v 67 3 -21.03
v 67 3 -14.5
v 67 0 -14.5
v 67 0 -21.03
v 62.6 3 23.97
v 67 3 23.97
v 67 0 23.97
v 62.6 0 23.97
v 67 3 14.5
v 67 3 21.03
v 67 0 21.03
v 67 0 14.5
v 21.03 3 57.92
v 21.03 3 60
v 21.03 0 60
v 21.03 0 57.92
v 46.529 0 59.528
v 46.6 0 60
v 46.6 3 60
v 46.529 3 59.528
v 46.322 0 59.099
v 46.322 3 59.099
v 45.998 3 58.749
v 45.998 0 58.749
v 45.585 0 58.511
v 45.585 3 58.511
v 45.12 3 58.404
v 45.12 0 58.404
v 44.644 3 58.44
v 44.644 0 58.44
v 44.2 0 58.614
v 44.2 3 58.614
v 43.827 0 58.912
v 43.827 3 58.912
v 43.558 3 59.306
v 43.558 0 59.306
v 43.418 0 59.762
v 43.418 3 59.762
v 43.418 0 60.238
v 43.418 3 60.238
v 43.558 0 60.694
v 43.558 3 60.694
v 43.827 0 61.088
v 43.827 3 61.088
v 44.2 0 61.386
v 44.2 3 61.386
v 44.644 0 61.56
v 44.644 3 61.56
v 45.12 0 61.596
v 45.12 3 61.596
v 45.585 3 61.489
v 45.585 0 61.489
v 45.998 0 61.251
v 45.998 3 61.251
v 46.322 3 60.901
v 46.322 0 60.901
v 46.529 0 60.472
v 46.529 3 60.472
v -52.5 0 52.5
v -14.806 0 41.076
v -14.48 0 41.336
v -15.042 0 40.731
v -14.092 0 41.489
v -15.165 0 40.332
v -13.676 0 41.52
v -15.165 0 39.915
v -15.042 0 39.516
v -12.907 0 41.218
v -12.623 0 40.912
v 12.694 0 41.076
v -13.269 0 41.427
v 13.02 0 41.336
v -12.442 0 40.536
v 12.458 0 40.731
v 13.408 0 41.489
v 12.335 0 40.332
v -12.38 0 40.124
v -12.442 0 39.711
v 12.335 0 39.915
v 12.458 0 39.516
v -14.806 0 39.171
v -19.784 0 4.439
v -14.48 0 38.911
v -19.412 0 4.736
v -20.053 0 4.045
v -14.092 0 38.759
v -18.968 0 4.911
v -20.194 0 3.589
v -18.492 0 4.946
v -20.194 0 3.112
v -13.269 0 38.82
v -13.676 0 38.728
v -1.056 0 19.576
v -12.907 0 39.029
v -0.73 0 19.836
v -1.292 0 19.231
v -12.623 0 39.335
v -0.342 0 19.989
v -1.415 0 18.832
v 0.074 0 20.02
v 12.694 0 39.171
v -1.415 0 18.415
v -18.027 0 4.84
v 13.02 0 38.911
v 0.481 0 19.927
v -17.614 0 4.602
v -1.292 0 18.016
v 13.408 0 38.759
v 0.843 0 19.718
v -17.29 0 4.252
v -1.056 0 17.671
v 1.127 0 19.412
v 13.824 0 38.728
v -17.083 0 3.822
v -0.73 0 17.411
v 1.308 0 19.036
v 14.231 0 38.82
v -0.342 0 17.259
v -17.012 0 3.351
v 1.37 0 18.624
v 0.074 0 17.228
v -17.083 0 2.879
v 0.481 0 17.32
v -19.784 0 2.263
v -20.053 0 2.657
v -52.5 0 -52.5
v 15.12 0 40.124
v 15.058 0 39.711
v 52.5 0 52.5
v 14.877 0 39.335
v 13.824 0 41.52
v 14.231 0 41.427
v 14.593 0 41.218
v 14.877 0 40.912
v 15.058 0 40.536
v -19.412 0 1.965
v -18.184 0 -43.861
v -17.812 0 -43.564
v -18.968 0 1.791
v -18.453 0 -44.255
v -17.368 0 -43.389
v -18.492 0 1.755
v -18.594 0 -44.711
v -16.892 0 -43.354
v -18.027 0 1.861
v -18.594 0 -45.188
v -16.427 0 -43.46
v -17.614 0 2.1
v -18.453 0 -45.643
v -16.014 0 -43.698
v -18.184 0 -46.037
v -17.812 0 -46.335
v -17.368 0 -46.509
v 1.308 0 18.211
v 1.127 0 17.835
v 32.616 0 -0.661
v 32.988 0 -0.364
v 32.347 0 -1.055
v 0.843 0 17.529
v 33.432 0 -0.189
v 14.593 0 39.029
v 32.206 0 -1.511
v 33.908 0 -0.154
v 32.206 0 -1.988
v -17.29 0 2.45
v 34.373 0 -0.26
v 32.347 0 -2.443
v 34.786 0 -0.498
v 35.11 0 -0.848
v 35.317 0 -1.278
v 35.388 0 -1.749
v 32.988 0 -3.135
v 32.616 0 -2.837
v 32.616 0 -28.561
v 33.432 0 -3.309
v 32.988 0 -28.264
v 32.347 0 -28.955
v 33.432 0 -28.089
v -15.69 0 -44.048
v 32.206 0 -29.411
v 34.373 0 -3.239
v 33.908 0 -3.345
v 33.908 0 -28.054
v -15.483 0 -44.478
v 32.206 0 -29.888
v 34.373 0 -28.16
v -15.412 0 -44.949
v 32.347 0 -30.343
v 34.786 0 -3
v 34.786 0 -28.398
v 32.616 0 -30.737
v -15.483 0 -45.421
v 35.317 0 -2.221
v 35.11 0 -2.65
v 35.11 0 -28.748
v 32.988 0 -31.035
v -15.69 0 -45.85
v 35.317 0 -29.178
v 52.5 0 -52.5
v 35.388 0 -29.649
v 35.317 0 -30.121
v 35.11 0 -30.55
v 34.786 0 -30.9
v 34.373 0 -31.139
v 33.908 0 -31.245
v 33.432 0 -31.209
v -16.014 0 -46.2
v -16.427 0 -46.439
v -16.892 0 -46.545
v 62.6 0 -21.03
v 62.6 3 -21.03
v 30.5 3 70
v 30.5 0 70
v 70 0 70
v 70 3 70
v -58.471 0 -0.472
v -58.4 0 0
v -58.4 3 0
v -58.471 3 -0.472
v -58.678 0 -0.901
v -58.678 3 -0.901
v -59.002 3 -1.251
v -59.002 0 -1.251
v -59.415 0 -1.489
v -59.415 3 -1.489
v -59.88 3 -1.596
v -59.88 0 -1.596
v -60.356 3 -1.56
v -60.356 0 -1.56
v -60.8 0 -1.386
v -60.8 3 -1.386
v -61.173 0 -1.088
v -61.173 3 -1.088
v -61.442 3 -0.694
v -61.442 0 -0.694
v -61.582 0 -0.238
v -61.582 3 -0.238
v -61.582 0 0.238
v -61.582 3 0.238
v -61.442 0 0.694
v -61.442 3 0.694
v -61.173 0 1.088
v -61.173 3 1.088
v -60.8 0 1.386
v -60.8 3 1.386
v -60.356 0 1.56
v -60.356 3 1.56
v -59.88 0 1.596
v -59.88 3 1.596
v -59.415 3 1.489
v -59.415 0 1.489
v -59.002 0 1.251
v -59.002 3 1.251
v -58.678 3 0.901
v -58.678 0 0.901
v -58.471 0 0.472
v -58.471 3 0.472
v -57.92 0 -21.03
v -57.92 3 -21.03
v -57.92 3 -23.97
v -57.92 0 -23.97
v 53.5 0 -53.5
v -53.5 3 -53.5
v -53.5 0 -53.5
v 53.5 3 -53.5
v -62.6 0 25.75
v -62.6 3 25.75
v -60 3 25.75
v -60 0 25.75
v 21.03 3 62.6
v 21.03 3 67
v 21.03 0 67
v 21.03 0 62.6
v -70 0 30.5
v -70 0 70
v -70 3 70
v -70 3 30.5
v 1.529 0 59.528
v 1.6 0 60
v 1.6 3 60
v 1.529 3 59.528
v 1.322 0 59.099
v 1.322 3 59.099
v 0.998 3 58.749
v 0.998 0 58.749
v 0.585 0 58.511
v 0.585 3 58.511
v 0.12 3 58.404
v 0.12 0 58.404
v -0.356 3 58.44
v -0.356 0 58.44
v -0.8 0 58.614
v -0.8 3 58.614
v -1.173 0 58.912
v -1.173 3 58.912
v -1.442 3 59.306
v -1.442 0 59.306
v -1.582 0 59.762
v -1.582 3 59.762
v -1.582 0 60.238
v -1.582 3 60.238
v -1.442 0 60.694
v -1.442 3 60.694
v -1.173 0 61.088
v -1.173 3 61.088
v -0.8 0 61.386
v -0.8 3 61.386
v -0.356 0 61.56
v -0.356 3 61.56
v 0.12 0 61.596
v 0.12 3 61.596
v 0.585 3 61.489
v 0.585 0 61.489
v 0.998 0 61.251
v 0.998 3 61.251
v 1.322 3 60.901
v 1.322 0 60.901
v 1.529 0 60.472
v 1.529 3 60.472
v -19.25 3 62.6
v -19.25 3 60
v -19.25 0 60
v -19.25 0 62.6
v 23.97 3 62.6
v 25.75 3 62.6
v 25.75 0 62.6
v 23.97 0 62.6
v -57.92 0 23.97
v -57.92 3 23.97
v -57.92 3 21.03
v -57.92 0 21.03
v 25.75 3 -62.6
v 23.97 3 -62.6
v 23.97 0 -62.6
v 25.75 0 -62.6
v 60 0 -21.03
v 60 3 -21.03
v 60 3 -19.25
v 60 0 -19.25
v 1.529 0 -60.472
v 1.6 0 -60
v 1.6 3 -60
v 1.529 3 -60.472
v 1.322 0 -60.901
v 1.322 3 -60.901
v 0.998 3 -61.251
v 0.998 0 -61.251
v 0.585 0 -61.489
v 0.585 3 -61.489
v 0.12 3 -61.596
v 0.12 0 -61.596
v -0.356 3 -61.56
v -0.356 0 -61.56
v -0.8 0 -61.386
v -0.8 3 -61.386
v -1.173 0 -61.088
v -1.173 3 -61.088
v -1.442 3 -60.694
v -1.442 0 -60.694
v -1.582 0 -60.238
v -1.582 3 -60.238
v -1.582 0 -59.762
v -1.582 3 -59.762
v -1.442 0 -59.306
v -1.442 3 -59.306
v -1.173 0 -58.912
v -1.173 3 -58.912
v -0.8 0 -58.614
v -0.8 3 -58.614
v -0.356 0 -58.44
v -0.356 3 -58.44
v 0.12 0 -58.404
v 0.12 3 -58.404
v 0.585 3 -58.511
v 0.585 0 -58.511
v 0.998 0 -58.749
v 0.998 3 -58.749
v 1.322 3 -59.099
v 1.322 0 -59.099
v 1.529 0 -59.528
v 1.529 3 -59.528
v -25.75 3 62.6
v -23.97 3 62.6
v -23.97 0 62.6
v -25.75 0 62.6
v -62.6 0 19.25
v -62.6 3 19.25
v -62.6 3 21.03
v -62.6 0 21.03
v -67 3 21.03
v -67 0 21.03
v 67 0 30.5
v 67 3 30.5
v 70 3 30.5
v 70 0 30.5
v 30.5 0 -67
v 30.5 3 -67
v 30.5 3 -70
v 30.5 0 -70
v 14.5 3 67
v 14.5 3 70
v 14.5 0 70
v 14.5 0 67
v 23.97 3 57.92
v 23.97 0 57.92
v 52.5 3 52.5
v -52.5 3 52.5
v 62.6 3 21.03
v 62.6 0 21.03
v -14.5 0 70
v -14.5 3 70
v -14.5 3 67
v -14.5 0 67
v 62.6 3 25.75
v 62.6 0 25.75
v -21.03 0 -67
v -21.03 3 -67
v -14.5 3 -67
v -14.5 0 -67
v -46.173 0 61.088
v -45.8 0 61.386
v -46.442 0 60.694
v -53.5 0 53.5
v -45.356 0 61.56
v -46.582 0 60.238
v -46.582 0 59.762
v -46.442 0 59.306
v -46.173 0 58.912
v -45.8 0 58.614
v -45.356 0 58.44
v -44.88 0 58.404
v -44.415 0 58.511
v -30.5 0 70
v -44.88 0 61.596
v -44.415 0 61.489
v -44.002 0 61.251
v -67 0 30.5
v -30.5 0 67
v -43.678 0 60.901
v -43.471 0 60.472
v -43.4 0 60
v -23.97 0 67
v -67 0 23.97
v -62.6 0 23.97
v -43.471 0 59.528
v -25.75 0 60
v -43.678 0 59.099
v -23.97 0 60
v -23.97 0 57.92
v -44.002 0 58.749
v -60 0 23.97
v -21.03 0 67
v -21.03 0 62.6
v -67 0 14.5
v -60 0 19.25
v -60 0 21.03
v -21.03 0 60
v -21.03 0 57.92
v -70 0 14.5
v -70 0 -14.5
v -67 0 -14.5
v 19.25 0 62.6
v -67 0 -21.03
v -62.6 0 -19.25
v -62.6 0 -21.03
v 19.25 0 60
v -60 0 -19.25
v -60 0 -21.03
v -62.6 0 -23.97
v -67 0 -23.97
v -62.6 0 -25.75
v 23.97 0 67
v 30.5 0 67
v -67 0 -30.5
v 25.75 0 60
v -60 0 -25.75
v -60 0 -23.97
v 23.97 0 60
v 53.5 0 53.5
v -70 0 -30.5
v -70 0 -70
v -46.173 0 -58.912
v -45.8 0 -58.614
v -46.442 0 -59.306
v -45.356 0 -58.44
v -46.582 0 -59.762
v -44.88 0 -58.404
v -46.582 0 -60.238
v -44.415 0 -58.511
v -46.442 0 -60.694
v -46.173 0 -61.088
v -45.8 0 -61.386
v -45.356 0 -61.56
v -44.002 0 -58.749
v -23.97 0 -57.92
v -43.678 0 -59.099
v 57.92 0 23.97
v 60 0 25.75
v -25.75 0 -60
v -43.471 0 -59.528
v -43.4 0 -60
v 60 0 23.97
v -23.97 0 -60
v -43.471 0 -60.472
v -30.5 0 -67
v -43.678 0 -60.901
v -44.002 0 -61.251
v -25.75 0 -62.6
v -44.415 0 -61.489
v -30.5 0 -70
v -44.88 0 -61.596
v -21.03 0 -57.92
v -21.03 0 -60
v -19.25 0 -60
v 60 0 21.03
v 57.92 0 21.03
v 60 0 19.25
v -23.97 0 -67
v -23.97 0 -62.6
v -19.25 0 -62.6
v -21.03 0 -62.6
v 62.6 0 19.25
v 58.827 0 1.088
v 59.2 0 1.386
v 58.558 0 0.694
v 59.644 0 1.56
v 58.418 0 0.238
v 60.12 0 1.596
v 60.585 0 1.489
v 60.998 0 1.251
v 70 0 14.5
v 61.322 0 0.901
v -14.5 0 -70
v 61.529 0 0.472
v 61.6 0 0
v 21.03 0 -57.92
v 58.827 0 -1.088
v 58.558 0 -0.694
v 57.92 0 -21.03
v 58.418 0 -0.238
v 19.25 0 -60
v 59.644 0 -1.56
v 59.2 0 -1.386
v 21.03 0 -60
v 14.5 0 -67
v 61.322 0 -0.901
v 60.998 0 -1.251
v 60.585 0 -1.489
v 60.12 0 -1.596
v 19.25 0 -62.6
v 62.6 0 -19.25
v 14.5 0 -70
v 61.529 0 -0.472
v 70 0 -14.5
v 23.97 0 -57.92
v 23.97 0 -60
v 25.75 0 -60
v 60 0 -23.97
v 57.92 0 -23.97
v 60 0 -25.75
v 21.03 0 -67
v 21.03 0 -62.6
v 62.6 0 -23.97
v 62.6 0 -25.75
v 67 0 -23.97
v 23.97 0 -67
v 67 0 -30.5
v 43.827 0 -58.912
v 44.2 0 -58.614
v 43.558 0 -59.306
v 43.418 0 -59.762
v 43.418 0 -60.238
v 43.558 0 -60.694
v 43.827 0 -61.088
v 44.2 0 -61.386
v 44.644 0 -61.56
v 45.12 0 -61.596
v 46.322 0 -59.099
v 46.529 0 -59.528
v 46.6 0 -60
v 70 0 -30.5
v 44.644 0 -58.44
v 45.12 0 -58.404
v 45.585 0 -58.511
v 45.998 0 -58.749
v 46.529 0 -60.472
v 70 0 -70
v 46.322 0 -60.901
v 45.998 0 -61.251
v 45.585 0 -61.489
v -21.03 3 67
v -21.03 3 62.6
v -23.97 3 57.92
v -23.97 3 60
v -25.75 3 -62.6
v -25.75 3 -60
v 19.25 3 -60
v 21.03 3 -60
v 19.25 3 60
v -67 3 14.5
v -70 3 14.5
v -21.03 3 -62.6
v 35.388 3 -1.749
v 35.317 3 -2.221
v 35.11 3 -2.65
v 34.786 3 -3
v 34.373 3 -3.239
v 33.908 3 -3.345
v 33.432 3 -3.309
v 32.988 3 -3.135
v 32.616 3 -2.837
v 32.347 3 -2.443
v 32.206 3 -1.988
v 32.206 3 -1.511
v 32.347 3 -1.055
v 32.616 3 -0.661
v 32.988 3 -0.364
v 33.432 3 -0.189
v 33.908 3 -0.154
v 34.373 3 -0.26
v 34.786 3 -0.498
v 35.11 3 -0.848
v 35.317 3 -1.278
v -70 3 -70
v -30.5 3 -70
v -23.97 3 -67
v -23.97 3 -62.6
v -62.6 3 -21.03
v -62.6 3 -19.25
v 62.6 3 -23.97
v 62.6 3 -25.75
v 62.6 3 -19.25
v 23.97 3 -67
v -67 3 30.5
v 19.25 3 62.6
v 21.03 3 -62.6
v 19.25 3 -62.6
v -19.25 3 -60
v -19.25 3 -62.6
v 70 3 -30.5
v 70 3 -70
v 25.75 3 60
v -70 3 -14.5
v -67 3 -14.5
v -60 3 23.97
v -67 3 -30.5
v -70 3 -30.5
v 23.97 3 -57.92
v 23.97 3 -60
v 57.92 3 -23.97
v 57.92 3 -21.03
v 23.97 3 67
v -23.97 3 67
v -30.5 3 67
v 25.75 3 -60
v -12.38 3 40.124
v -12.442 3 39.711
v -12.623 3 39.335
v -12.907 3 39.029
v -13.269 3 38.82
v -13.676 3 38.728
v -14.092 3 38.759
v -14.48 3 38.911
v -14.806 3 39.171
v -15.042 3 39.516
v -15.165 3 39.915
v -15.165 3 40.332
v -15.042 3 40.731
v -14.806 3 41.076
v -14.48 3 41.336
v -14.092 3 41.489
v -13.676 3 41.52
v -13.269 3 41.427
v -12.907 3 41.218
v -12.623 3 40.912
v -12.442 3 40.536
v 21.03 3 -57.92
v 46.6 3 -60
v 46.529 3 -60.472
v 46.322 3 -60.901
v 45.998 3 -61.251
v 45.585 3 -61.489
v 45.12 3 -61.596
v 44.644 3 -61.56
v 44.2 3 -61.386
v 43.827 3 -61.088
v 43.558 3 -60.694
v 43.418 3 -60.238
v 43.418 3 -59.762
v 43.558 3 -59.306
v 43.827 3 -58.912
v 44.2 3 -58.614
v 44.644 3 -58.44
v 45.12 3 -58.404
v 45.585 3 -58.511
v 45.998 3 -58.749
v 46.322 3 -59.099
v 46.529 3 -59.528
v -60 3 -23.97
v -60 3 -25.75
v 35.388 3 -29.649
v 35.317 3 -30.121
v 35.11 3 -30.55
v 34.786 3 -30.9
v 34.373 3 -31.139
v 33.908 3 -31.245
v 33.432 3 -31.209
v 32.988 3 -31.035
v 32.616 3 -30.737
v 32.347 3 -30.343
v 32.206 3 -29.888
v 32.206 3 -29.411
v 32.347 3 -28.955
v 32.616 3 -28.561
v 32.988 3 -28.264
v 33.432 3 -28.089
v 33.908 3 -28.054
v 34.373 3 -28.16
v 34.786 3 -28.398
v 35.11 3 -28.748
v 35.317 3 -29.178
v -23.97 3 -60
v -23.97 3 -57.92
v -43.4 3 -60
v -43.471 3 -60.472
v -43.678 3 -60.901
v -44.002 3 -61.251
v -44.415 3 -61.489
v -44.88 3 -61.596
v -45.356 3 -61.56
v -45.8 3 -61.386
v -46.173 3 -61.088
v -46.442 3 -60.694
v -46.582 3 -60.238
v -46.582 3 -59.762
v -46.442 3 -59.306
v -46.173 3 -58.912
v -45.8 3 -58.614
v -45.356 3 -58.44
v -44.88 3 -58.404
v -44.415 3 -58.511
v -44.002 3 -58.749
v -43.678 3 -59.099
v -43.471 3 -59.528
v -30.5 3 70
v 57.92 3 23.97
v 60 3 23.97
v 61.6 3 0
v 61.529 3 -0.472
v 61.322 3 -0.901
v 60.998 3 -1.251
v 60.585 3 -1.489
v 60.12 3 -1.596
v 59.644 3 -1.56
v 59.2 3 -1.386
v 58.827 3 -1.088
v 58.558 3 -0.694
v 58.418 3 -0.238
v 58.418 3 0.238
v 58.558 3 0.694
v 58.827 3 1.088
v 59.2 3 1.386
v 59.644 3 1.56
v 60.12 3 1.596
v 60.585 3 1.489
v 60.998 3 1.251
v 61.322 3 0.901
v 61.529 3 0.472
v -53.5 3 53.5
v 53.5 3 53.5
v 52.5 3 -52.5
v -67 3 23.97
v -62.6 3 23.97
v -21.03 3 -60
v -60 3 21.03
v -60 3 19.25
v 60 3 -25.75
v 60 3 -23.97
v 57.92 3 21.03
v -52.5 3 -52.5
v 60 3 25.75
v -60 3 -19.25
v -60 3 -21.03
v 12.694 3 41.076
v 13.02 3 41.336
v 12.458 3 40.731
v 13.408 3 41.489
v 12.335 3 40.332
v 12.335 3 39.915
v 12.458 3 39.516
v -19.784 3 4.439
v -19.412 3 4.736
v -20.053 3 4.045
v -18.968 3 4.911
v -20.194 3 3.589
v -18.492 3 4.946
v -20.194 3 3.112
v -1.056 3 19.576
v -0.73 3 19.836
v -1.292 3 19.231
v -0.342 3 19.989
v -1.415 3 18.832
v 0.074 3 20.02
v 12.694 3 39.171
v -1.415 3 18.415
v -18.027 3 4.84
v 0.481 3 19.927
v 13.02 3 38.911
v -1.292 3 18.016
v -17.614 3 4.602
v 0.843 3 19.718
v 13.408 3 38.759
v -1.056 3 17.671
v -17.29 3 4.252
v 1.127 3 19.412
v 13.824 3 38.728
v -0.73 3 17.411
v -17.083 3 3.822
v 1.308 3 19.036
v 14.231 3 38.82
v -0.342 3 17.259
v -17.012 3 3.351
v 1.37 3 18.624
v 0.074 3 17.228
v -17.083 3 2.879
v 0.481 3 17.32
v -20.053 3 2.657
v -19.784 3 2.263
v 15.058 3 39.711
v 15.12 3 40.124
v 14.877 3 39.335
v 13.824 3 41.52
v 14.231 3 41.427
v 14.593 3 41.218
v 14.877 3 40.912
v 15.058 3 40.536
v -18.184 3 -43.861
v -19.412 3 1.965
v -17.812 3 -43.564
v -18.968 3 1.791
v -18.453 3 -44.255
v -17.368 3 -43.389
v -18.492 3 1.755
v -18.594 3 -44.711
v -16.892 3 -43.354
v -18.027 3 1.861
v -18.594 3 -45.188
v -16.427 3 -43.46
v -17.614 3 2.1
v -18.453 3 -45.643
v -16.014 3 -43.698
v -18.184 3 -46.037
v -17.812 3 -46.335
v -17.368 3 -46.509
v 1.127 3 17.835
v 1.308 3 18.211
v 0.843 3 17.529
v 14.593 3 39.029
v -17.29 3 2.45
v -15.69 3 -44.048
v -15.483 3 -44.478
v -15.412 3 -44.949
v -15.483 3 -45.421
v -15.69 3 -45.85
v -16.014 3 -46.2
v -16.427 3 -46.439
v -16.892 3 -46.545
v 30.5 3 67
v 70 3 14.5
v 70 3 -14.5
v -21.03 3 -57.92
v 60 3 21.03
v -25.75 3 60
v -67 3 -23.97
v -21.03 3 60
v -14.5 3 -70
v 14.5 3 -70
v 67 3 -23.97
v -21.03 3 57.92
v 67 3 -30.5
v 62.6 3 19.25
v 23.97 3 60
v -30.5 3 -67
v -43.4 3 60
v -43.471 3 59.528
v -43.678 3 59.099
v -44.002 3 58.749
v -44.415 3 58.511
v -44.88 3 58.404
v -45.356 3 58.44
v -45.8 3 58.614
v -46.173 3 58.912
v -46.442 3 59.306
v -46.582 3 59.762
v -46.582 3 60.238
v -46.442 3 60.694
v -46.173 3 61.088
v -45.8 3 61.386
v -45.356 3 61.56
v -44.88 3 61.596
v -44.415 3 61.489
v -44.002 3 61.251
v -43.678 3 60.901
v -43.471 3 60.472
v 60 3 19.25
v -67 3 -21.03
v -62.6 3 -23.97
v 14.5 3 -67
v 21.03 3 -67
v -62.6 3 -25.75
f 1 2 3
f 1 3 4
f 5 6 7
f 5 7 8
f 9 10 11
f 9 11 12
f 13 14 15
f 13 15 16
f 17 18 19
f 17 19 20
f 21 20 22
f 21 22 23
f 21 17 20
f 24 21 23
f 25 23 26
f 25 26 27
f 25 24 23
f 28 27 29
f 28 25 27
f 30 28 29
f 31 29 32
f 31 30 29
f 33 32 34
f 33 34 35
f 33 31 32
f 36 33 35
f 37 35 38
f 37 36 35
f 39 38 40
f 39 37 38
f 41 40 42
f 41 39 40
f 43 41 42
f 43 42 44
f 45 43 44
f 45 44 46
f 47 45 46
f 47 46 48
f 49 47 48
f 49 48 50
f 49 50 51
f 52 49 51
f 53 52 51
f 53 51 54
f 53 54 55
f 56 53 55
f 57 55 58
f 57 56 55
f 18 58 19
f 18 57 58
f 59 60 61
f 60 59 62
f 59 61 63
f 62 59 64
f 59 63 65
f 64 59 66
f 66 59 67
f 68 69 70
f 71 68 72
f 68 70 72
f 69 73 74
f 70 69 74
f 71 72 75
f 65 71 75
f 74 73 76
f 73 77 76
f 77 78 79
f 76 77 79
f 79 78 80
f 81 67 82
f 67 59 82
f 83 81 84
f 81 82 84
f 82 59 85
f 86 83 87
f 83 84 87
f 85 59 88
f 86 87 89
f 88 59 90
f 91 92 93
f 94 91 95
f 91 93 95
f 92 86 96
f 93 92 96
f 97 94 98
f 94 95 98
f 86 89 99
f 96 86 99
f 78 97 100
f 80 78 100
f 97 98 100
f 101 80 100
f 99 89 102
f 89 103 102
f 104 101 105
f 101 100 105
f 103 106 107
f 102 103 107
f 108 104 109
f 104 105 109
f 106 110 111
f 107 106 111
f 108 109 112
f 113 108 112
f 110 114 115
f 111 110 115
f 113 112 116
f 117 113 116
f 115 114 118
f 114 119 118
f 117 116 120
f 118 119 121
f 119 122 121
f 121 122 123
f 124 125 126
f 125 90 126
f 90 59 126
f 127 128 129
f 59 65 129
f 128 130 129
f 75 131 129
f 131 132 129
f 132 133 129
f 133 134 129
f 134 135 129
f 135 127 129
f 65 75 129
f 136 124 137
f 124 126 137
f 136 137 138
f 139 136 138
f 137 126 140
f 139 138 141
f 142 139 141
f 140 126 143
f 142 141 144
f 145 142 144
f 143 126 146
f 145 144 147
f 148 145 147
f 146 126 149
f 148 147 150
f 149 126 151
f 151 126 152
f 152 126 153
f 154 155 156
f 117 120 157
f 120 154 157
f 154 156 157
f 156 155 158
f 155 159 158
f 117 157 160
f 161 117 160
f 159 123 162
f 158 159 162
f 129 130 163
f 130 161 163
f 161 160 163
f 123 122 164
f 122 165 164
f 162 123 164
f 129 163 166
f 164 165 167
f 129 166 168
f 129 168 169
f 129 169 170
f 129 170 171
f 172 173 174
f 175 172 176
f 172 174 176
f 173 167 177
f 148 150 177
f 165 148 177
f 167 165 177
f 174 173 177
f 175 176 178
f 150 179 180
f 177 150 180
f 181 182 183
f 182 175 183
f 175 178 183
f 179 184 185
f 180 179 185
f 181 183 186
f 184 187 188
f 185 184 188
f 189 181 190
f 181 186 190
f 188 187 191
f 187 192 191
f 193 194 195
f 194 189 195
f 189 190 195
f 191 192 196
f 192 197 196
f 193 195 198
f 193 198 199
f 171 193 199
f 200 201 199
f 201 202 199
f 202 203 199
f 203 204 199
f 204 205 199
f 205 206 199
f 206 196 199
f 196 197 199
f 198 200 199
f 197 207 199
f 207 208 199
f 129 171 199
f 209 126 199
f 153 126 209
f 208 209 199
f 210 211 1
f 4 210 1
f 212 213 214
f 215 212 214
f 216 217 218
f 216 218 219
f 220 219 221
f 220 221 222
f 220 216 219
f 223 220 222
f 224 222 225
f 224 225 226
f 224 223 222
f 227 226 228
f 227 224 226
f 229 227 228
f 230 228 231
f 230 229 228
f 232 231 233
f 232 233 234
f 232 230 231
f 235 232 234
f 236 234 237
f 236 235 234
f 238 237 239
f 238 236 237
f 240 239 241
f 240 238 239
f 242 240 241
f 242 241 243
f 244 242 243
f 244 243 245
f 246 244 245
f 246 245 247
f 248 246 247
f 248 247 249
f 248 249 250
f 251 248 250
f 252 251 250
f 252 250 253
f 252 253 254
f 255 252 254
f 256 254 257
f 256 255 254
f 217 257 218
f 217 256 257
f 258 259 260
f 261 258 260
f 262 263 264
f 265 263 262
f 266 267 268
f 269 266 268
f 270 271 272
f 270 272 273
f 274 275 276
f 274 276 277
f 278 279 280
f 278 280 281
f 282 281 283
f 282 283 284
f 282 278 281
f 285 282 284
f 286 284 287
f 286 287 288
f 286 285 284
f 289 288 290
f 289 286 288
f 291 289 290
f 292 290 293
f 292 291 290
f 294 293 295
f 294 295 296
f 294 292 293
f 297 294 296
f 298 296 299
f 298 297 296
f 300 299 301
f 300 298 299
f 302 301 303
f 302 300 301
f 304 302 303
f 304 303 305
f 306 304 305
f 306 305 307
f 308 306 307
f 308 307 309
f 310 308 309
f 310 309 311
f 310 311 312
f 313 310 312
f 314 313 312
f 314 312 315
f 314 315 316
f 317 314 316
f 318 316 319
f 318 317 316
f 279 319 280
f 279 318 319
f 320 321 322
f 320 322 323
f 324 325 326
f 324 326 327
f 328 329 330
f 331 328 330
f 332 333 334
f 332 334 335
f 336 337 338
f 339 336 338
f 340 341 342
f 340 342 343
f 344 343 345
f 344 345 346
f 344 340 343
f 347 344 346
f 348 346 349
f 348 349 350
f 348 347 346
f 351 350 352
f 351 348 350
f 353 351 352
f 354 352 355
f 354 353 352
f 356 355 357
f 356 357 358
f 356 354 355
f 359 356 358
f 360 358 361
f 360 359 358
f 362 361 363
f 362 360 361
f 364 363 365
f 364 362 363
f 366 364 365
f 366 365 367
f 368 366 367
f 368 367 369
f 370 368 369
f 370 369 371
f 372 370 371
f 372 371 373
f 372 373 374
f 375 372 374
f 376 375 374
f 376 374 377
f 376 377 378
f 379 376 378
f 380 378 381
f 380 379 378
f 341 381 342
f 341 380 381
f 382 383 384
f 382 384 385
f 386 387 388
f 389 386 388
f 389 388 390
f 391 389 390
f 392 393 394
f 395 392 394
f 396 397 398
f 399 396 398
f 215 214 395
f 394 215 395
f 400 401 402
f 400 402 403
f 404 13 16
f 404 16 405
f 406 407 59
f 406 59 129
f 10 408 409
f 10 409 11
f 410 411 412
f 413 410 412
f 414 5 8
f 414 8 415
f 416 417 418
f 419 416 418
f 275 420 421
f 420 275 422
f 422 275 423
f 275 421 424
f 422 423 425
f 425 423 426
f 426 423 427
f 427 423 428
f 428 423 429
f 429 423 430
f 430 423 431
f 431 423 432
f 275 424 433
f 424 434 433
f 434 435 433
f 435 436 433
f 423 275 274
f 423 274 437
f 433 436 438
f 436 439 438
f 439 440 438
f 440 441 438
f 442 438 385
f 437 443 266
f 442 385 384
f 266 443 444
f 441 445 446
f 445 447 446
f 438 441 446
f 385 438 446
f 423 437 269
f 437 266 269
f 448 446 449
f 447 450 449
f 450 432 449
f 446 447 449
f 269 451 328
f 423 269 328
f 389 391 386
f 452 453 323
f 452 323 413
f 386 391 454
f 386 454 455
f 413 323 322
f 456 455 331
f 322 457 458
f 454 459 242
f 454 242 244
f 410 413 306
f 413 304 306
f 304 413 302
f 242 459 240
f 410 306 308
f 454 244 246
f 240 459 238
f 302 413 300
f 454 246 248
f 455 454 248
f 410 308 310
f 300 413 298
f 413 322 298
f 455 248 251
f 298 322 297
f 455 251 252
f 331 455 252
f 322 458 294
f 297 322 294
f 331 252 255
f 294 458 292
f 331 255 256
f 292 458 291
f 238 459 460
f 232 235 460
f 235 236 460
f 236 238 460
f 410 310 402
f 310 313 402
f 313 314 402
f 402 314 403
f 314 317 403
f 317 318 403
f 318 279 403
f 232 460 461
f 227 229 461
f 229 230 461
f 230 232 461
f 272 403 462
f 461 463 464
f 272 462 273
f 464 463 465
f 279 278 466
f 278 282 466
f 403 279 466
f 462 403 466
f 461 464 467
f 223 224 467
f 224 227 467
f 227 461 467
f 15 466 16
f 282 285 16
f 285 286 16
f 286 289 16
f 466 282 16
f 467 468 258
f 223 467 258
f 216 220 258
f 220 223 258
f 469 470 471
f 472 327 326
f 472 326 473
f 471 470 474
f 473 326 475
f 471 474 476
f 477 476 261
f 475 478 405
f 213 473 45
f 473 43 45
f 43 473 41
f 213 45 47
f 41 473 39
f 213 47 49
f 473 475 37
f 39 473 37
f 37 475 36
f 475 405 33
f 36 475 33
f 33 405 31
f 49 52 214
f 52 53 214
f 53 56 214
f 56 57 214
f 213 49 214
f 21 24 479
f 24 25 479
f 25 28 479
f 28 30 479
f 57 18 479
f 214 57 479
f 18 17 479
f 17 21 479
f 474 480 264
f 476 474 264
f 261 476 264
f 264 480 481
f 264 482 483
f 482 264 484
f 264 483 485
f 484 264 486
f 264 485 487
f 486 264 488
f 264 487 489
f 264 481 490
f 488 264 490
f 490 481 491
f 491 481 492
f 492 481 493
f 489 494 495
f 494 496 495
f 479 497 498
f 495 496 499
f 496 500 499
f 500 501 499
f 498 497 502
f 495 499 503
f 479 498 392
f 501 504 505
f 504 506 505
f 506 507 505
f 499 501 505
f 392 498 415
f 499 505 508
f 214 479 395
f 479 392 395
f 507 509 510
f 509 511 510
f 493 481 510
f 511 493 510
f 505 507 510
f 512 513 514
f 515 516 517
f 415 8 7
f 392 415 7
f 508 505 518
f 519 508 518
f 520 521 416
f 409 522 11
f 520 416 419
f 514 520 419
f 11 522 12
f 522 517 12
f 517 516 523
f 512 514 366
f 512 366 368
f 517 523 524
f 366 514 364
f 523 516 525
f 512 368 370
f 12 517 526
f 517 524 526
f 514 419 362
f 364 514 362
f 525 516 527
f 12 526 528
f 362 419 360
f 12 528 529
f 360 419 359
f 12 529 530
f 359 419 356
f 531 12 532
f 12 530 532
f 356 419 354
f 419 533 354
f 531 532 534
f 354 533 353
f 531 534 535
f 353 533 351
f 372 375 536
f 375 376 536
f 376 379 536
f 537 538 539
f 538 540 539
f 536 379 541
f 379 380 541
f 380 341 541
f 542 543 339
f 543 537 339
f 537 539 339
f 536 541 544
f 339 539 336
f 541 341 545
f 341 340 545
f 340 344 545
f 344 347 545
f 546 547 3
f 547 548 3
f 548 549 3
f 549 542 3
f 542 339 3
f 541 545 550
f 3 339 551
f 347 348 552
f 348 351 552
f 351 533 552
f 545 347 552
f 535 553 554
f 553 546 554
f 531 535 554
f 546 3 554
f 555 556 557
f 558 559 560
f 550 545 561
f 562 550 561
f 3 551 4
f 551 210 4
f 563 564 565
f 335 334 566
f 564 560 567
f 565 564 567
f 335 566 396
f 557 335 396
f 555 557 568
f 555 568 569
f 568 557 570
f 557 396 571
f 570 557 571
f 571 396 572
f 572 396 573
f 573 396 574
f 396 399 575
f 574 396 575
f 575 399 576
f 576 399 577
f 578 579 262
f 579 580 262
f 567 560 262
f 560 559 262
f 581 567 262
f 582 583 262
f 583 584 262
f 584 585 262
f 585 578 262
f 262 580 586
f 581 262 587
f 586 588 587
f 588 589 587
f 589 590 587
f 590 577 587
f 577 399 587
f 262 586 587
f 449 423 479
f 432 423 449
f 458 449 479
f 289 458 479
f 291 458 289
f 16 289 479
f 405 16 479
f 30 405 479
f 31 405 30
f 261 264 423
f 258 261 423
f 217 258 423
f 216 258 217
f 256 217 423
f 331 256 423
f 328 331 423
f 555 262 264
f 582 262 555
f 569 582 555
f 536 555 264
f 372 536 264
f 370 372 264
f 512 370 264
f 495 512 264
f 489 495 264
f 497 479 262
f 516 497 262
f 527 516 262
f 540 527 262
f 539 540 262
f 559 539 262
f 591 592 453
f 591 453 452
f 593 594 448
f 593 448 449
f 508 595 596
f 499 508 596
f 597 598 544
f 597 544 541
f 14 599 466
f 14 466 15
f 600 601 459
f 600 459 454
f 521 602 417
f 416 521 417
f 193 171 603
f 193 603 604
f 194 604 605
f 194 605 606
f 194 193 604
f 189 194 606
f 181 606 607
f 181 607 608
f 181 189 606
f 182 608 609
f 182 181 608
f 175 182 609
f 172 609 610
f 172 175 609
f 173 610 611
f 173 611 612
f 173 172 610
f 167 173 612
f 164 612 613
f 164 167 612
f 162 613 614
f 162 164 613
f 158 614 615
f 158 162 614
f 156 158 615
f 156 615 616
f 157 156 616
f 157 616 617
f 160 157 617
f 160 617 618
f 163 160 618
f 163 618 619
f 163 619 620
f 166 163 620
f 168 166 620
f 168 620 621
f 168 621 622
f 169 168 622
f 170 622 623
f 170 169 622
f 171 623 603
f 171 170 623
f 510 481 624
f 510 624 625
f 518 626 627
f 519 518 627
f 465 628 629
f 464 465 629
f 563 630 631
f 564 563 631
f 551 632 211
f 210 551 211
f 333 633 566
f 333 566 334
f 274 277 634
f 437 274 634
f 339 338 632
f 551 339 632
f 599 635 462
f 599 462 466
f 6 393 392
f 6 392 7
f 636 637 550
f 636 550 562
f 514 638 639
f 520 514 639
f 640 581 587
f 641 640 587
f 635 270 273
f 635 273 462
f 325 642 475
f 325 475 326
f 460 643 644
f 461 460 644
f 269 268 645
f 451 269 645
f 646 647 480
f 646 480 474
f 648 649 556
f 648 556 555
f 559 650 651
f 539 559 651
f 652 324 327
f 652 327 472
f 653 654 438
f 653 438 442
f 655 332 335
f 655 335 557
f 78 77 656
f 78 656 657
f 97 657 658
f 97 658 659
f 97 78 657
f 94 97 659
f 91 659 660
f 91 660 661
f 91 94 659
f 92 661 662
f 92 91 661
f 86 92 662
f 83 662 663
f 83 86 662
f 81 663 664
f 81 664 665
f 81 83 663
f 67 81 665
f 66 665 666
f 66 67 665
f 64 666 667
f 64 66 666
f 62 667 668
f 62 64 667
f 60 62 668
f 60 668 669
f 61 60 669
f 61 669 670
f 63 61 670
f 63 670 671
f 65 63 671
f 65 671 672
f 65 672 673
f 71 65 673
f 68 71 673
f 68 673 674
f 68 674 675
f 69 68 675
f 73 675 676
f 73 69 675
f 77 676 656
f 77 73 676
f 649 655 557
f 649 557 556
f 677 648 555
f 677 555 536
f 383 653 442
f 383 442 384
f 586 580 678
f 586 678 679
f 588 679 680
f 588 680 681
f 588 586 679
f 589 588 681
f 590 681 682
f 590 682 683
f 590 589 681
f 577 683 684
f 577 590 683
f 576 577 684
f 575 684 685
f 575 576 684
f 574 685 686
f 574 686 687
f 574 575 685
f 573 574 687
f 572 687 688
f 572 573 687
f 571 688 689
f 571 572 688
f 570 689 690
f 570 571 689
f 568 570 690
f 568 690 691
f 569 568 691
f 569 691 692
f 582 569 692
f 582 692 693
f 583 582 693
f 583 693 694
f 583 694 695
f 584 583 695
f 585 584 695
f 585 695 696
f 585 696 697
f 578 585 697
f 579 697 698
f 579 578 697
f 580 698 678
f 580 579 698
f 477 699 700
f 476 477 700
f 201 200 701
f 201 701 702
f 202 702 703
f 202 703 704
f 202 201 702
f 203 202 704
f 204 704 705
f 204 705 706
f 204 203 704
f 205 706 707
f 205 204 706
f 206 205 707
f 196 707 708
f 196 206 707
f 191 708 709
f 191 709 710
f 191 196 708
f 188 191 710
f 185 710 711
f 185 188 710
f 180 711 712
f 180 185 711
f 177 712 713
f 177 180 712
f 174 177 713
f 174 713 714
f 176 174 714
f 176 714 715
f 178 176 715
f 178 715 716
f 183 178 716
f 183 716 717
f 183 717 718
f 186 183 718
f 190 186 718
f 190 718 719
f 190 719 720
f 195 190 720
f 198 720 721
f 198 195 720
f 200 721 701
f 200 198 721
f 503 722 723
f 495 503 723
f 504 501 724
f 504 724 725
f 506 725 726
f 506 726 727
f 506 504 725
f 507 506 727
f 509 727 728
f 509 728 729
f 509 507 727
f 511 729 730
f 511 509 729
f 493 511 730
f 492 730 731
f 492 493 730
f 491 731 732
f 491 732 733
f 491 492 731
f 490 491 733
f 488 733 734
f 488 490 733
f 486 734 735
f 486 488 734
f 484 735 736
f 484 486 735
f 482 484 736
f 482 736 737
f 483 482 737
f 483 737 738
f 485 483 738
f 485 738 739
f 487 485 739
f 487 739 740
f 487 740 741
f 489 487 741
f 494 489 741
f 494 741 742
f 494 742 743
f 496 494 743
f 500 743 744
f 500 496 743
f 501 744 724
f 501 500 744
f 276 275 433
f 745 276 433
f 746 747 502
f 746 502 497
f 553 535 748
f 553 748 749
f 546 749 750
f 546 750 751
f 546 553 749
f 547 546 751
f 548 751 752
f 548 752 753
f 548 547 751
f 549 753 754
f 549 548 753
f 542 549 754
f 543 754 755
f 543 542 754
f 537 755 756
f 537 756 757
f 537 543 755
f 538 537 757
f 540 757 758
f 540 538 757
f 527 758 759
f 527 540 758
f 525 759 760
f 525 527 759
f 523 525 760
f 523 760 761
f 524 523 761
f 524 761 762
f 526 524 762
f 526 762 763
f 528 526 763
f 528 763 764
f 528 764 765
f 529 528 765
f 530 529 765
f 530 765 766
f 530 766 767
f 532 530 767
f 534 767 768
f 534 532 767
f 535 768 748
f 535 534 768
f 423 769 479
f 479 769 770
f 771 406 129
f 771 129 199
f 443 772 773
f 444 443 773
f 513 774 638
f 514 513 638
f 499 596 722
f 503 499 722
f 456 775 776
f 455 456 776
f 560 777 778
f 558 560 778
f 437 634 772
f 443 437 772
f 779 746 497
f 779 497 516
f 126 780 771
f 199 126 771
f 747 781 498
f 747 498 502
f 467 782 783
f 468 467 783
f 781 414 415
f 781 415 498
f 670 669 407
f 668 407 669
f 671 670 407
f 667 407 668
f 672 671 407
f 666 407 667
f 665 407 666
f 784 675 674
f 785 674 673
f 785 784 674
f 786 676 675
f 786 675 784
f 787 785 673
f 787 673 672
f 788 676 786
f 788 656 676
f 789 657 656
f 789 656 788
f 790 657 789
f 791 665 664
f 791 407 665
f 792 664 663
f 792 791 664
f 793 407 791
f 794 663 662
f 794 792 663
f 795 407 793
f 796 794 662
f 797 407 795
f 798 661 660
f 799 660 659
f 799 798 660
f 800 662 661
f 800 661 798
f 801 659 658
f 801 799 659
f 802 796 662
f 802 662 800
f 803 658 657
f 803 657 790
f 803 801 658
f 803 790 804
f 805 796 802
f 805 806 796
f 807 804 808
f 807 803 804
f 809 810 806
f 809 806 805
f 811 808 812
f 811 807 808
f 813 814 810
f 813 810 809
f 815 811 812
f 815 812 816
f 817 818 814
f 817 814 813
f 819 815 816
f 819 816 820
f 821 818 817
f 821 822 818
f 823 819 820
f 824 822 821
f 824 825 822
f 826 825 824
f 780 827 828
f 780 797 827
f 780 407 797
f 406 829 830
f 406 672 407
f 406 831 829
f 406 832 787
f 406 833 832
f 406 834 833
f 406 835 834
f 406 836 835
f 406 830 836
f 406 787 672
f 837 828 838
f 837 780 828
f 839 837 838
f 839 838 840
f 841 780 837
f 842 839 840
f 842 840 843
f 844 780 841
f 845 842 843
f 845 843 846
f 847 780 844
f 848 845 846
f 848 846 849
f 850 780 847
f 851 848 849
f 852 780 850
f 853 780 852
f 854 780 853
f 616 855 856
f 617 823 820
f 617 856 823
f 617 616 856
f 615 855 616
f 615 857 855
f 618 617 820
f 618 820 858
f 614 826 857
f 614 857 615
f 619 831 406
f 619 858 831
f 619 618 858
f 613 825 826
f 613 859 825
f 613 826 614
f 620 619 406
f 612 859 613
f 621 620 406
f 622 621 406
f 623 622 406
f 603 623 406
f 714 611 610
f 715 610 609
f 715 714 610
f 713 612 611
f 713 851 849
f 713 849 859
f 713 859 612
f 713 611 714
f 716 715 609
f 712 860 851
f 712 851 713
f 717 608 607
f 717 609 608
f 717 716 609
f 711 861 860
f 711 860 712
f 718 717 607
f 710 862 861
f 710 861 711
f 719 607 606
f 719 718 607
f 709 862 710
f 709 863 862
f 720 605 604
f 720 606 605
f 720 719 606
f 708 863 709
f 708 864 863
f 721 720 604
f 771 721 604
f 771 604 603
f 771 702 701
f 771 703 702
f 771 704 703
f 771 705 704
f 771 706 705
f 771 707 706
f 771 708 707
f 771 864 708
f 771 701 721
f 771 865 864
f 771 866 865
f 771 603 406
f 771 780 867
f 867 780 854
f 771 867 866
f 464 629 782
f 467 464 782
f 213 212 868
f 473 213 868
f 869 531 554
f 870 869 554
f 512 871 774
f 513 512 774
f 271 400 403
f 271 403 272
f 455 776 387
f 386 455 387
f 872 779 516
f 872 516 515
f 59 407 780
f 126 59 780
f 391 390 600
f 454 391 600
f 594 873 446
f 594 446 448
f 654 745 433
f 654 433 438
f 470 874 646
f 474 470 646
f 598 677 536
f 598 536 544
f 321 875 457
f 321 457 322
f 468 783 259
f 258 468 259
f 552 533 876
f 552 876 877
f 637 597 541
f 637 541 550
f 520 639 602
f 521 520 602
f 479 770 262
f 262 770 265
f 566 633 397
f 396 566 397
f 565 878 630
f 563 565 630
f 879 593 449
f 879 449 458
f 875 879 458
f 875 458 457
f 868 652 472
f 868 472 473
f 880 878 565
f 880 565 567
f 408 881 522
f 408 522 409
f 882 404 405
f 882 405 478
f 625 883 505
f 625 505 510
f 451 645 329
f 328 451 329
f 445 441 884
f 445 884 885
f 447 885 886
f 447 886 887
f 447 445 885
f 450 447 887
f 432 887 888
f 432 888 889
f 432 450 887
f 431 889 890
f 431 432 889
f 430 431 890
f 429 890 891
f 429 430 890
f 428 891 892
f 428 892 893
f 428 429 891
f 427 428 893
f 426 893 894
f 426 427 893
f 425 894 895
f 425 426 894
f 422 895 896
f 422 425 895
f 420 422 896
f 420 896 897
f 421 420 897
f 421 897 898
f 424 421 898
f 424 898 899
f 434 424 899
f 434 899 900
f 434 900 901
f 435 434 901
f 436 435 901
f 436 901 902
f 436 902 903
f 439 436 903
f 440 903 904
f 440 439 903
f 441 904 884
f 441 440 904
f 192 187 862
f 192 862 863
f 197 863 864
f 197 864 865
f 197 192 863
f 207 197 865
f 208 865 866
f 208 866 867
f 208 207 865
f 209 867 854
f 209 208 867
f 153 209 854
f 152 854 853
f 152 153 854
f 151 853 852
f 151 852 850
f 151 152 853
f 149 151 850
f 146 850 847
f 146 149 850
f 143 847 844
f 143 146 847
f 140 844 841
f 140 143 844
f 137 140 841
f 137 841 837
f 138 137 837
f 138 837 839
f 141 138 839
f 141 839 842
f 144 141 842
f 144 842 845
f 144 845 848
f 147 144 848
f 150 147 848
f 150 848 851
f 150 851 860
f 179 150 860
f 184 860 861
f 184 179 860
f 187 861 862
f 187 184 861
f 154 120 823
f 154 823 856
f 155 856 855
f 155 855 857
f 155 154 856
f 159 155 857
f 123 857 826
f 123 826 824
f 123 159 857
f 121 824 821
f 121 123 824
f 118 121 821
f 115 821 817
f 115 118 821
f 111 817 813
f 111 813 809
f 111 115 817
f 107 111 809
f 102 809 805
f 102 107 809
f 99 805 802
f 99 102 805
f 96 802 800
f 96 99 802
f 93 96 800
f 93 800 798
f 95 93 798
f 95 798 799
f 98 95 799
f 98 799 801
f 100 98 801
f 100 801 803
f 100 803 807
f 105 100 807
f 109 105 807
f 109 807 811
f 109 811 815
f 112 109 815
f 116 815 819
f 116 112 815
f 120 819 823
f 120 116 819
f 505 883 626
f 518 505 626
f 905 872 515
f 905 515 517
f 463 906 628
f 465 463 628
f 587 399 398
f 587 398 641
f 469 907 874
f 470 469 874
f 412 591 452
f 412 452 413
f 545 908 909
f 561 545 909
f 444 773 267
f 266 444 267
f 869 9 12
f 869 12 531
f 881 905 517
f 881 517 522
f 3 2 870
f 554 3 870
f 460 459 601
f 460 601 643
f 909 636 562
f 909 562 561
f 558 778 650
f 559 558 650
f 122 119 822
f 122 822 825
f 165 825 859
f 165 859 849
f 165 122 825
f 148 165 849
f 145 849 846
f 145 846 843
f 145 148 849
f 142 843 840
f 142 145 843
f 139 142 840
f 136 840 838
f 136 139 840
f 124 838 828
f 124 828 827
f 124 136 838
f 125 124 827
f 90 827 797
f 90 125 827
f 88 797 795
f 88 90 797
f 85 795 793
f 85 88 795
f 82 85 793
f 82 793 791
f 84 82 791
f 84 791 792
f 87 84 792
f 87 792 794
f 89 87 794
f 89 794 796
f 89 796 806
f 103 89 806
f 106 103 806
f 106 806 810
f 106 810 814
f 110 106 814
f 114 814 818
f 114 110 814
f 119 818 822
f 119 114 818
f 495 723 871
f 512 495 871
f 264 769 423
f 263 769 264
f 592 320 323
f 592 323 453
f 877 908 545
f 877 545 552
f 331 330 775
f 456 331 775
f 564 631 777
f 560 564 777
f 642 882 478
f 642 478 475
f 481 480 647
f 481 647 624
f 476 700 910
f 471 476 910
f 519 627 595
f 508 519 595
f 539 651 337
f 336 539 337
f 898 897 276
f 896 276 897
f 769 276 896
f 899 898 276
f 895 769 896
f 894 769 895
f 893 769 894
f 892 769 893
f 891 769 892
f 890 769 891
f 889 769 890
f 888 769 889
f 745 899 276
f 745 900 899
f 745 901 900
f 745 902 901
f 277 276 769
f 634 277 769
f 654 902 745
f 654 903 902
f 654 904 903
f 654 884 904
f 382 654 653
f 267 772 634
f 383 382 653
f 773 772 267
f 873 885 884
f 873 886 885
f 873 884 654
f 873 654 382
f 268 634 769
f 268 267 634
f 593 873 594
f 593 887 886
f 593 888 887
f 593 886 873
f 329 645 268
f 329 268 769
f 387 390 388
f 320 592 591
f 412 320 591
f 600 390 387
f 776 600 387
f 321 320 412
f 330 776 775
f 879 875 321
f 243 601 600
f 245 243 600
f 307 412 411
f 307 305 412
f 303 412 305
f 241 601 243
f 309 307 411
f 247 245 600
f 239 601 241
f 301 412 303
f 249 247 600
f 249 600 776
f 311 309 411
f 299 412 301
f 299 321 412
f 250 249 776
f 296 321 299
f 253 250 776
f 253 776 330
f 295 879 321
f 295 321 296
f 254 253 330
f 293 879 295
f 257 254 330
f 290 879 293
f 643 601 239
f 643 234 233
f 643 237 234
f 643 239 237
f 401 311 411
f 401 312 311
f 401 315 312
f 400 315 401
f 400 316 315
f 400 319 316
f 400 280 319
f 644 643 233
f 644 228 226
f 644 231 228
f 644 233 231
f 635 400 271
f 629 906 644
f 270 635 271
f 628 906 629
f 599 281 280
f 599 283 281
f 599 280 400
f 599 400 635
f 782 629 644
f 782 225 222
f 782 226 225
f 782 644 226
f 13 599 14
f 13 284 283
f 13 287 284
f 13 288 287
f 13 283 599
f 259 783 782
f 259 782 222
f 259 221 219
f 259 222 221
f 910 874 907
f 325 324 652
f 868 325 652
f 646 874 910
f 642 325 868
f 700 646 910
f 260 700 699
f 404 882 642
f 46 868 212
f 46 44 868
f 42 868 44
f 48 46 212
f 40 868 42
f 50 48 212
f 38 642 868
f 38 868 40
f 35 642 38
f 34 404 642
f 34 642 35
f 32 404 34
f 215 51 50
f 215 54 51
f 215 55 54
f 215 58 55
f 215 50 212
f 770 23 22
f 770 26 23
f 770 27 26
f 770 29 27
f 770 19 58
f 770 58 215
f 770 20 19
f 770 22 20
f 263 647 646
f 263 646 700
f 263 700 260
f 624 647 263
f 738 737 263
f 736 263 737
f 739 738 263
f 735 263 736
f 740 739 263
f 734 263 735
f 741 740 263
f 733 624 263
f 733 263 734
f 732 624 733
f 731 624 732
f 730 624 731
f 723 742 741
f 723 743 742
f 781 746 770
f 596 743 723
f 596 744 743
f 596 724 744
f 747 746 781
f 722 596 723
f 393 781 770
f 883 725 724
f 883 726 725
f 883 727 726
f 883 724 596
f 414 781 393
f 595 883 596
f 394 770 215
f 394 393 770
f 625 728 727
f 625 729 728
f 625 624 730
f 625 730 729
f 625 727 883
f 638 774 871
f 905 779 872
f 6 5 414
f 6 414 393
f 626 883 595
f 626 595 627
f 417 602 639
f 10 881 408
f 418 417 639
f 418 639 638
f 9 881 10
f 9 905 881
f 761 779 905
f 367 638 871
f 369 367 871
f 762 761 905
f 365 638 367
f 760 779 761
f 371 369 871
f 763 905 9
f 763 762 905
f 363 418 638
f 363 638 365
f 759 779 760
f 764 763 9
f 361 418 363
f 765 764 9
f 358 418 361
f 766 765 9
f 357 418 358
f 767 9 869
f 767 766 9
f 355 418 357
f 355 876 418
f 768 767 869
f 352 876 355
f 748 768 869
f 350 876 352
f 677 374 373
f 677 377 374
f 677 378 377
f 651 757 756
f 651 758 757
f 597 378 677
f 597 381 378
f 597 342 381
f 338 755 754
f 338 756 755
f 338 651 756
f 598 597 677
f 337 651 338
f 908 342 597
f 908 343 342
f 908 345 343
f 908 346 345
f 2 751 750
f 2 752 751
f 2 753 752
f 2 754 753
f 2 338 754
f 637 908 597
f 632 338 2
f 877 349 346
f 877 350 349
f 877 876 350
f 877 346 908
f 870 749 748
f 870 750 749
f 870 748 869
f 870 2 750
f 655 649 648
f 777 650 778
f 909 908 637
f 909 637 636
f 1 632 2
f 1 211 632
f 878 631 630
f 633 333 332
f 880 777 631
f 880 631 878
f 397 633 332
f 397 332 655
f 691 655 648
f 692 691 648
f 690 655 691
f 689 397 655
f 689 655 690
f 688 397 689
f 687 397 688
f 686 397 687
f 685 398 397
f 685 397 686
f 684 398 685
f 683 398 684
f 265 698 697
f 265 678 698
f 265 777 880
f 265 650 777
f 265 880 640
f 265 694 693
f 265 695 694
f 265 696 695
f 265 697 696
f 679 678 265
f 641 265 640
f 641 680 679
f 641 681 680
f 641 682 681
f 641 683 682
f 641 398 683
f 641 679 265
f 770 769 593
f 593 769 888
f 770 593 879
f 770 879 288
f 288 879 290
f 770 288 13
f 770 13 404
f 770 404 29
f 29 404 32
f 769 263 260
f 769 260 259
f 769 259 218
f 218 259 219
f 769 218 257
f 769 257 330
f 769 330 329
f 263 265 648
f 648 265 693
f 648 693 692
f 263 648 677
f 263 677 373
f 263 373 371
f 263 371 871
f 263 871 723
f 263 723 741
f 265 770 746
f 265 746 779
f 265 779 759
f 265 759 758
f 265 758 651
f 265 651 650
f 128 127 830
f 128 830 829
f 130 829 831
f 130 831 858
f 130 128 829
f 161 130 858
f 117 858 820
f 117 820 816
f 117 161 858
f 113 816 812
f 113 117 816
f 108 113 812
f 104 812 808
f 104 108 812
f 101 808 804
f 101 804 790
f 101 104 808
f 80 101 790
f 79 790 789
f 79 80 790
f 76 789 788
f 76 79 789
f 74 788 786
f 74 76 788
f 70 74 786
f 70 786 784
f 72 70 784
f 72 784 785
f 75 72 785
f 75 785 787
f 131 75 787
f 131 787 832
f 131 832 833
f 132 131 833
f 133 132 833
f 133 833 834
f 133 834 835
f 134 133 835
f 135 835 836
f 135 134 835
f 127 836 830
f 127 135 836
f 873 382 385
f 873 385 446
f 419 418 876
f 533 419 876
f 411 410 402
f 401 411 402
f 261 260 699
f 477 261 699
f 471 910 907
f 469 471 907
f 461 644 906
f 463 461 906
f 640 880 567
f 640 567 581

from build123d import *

# Parameters (mm, degrees)
SKETCH2_W           = 140
SKETCH2_H           = 140
SKETCH2_R           = 1.6
SKETCH2_R_2         = 1.4
BOSS_EXTRUDE2_DEPTH = 3
SKETCH3_W           = 16
SKETCH3_H           = 3
SKETCH3_W_2         = 3
SKETCH3_H_2         = 16
CUT_EXTRUDE2_DEPTH  = 3
CUT_EXTRUDE3_DEPTH  = 3
SKETCH5_W           = 107
SKETCH5_H           = 107
SKETCH5_W_2         = 105
SKETCH5_H_2         = 105
CUT_EXTRUDE5_DEPTH  = 3


with BuildPart() as part:
    # Sketch2 → Boss-Extrude2 (new body)
    with BuildSketch(Plane(origin=(0, 0, 0), x_dir=(1, 0, 0), z_dir=(0, 1, 0))):
        Rectangle(SKETCH2_W, SKETCH2_H)
        with Locations((-17.011581703, 44.949159058)):
            Circle(SKETCH2_R, mode=Mode.SUBTRACT)
        with Locations((-18.611581703, -3.350840942)):
            Circle(SKETCH2_R, mode=Mode.SUBTRACT)
        with Locations((33.788418297, 29.649159058)):
            Circle(SKETCH2_R, mode=Mode.SUBTRACT)
        with Locations((33.788418297, 1.749159058)):
            Circle(SKETCH2_R, mode=Mode.SUBTRACT)
        with Locations((0, 60)):
            Circle(SKETCH2_R, mode=Mode.SUBTRACT)
        with Locations((-60, 0)):
            Circle(SKETCH2_R, mode=Mode.SUBTRACT)
        with Locations((0, -60)):
            Circle(SKETCH2_R, mode=Mode.SUBTRACT)
        with Locations((60, 0)):
            Circle(SKETCH2_R, mode=Mode.SUBTRACT)
        with Locations((-45, 60)):
            Circle(SKETCH2_R, mode=Mode.SUBTRACT)
        with Locations((45, 60)):
            Circle(SKETCH2_R, mode=Mode.SUBTRACT)
        with Locations((-45, -60)):
            Circle(SKETCH2_R, mode=Mode.SUBTRACT)
        with Locations((45, -60)):
            Circle(SKETCH2_R, mode=Mode.SUBTRACT)
        with Locations((-0.030225379, -18.62367845)):
            Circle(SKETCH2_R_2, mode=Mode.SUBTRACT)
        with Locations((-13.780225379, -40.12367845)):
            Circle(SKETCH2_R_2, mode=Mode.SUBTRACT)
        with Locations((13.719774621, -40.12367845)):
            Circle(SKETCH2_R_2, mode=Mode.SUBTRACT)
    extrude(amount=BOSS_EXTRUDE2_DEPTH)

    # Sketch3 → Cut-Extrude2 (cut)
    with BuildSketch(Plane(origin=(0, 3, 0), x_dir=(1, 0, 0), z_dir=(0, 1, 0))):
        with Locations((-22.5, 68.5)):
            Rectangle(SKETCH3_W, SKETCH3_H)
        with Locations((-22.5, -68.5)):
            Rectangle(SKETCH3_W, SKETCH3_H)
        with Locations((22.5, -68.5)):
            Rectangle(SKETCH3_W, SKETCH3_H)
        with Locations((22.5, 68.5)):
            Rectangle(SKETCH3_W, SKETCH3_H)
        with Locations((-68.5, 22.5)):
            Rectangle(SKETCH3_W_2, SKETCH3_H_2)
        with Locations((68.5, 22.5)):
            Rectangle(SKETCH3_W_2, SKETCH3_H_2)
        with Locations((68.5, -22.5)):
            Rectangle(SKETCH3_W_2, SKETCH3_H_2)
        with Locations((-68.5, -22.5)):
            Rectangle(SKETCH3_W_2, SKETCH3_H_2)
    extrude(amount=-CUT_EXTRUDE2_DEPTH, mode=Mode.SUBTRACT)

    # Sketch4 → Cut-Extrude3 (cut)
    with BuildSketch(Plane(origin=(0, 3, 0), x_dir=(1, 0, 0), z_dir=(0, 1, 0))):
        Polygon((-23.97, 67), (-23.97, 62.6), (-25.75, 62.6), (-25.75, 60), (-23.97, 60), (-23.97, 57.92), (-21.03, 57.92), (-21.03, 60), (-19.25, 60), (-19.25, 62.6), (-21.03, 62.6), (-21.03, 67), align=None)
        Polygon((-23.97, -62.6), (-25.75, -62.6), (-25.75, -60), (-23.97, -60), (-23.97, -57.92), (-21.03, -57.92), (-21.03, -60), (-19.25, -60), (-19.25, -62.6), (-21.03, -62.6), (-21.03, -67), (-23.97, -67), align=None)
        Polygon((21.03, -60), (21.03, -57.92), (23.97, -57.92), (23.97, -60), (25.75, -60), (25.75, -62.6), (23.97, -62.6), (23.97, -67), (21.03, -67), (21.03, -62.6), (19.25, -62.6), (19.25, -60), align=None)
        Polygon((21.03, 67), (23.97, 67), (23.97, 62.6), (25.75, 62.6), (25.75, 60), (23.97, 60), (23.97, 57.92), (21.03, 57.92), (21.03, 60), (19.25, 60), (19.25, 62.6), (21.03, 62.6), align=None)
        Polygon((67, 23.97), (62.6, 23.97), (62.6, 25.75), (60, 25.75), (60, 23.97), (57.92, 23.97), (57.92, 21.03), (60, 21.03), (60, 19.25), (62.6, 19.25), (62.6, 21.03), (67, 21.03), align=None)
        Polygon((-67, 23.97), (-67, 21.03), (-62.6, 21.03), (-62.6, 19.25), (-60, 19.25), (-60, 21.03), (-57.92, 21.03), (-57.92, 23.97), (-60, 23.97), (-60, 25.75), (-62.6, 25.75), (-62.6, 23.97), align=None)
        Polygon((-67, -23.97), (-62.6, -23.97), (-62.6, -25.75), (-60, -25.75), (-60, -23.97), (-57.92, -23.97), (-57.92, -21.03), (-60, -21.03), (-60, -19.25), (-62.6, -19.25), (-62.6, -21.03), (-67, -21.03), align=None)
        Polygon((67, -23.97), (62.6, -23.97), (62.6, -25.75), (60, -25.75), (60, -23.97), (57.92, -23.97), (57.92, -21.03), (60, -21.03), (60, -19.25), (62.6, -19.25), (62.6, -21.03), (67, -21.03), align=None)
    extrude(amount=-CUT_EXTRUDE3_DEPTH, mode=Mode.SUBTRACT)

    # Sketch5 → Cut-Extrude5 (cut)
    with BuildSketch(Plane(origin=(0, 3, 0), x_dir=(1, 0, 0), z_dir=(0, 1, 0))):
        Rectangle(SKETCH5_W, SKETCH5_H)
        Rectangle(SKETCH5_W_2, SKETCH5_H_2, mode=Mode.SUBTRACT)
    extrude(amount=-CUT_EXTRUDE5_DEPTH, mode=Mode.SUBTRACT)


solid = part.part
